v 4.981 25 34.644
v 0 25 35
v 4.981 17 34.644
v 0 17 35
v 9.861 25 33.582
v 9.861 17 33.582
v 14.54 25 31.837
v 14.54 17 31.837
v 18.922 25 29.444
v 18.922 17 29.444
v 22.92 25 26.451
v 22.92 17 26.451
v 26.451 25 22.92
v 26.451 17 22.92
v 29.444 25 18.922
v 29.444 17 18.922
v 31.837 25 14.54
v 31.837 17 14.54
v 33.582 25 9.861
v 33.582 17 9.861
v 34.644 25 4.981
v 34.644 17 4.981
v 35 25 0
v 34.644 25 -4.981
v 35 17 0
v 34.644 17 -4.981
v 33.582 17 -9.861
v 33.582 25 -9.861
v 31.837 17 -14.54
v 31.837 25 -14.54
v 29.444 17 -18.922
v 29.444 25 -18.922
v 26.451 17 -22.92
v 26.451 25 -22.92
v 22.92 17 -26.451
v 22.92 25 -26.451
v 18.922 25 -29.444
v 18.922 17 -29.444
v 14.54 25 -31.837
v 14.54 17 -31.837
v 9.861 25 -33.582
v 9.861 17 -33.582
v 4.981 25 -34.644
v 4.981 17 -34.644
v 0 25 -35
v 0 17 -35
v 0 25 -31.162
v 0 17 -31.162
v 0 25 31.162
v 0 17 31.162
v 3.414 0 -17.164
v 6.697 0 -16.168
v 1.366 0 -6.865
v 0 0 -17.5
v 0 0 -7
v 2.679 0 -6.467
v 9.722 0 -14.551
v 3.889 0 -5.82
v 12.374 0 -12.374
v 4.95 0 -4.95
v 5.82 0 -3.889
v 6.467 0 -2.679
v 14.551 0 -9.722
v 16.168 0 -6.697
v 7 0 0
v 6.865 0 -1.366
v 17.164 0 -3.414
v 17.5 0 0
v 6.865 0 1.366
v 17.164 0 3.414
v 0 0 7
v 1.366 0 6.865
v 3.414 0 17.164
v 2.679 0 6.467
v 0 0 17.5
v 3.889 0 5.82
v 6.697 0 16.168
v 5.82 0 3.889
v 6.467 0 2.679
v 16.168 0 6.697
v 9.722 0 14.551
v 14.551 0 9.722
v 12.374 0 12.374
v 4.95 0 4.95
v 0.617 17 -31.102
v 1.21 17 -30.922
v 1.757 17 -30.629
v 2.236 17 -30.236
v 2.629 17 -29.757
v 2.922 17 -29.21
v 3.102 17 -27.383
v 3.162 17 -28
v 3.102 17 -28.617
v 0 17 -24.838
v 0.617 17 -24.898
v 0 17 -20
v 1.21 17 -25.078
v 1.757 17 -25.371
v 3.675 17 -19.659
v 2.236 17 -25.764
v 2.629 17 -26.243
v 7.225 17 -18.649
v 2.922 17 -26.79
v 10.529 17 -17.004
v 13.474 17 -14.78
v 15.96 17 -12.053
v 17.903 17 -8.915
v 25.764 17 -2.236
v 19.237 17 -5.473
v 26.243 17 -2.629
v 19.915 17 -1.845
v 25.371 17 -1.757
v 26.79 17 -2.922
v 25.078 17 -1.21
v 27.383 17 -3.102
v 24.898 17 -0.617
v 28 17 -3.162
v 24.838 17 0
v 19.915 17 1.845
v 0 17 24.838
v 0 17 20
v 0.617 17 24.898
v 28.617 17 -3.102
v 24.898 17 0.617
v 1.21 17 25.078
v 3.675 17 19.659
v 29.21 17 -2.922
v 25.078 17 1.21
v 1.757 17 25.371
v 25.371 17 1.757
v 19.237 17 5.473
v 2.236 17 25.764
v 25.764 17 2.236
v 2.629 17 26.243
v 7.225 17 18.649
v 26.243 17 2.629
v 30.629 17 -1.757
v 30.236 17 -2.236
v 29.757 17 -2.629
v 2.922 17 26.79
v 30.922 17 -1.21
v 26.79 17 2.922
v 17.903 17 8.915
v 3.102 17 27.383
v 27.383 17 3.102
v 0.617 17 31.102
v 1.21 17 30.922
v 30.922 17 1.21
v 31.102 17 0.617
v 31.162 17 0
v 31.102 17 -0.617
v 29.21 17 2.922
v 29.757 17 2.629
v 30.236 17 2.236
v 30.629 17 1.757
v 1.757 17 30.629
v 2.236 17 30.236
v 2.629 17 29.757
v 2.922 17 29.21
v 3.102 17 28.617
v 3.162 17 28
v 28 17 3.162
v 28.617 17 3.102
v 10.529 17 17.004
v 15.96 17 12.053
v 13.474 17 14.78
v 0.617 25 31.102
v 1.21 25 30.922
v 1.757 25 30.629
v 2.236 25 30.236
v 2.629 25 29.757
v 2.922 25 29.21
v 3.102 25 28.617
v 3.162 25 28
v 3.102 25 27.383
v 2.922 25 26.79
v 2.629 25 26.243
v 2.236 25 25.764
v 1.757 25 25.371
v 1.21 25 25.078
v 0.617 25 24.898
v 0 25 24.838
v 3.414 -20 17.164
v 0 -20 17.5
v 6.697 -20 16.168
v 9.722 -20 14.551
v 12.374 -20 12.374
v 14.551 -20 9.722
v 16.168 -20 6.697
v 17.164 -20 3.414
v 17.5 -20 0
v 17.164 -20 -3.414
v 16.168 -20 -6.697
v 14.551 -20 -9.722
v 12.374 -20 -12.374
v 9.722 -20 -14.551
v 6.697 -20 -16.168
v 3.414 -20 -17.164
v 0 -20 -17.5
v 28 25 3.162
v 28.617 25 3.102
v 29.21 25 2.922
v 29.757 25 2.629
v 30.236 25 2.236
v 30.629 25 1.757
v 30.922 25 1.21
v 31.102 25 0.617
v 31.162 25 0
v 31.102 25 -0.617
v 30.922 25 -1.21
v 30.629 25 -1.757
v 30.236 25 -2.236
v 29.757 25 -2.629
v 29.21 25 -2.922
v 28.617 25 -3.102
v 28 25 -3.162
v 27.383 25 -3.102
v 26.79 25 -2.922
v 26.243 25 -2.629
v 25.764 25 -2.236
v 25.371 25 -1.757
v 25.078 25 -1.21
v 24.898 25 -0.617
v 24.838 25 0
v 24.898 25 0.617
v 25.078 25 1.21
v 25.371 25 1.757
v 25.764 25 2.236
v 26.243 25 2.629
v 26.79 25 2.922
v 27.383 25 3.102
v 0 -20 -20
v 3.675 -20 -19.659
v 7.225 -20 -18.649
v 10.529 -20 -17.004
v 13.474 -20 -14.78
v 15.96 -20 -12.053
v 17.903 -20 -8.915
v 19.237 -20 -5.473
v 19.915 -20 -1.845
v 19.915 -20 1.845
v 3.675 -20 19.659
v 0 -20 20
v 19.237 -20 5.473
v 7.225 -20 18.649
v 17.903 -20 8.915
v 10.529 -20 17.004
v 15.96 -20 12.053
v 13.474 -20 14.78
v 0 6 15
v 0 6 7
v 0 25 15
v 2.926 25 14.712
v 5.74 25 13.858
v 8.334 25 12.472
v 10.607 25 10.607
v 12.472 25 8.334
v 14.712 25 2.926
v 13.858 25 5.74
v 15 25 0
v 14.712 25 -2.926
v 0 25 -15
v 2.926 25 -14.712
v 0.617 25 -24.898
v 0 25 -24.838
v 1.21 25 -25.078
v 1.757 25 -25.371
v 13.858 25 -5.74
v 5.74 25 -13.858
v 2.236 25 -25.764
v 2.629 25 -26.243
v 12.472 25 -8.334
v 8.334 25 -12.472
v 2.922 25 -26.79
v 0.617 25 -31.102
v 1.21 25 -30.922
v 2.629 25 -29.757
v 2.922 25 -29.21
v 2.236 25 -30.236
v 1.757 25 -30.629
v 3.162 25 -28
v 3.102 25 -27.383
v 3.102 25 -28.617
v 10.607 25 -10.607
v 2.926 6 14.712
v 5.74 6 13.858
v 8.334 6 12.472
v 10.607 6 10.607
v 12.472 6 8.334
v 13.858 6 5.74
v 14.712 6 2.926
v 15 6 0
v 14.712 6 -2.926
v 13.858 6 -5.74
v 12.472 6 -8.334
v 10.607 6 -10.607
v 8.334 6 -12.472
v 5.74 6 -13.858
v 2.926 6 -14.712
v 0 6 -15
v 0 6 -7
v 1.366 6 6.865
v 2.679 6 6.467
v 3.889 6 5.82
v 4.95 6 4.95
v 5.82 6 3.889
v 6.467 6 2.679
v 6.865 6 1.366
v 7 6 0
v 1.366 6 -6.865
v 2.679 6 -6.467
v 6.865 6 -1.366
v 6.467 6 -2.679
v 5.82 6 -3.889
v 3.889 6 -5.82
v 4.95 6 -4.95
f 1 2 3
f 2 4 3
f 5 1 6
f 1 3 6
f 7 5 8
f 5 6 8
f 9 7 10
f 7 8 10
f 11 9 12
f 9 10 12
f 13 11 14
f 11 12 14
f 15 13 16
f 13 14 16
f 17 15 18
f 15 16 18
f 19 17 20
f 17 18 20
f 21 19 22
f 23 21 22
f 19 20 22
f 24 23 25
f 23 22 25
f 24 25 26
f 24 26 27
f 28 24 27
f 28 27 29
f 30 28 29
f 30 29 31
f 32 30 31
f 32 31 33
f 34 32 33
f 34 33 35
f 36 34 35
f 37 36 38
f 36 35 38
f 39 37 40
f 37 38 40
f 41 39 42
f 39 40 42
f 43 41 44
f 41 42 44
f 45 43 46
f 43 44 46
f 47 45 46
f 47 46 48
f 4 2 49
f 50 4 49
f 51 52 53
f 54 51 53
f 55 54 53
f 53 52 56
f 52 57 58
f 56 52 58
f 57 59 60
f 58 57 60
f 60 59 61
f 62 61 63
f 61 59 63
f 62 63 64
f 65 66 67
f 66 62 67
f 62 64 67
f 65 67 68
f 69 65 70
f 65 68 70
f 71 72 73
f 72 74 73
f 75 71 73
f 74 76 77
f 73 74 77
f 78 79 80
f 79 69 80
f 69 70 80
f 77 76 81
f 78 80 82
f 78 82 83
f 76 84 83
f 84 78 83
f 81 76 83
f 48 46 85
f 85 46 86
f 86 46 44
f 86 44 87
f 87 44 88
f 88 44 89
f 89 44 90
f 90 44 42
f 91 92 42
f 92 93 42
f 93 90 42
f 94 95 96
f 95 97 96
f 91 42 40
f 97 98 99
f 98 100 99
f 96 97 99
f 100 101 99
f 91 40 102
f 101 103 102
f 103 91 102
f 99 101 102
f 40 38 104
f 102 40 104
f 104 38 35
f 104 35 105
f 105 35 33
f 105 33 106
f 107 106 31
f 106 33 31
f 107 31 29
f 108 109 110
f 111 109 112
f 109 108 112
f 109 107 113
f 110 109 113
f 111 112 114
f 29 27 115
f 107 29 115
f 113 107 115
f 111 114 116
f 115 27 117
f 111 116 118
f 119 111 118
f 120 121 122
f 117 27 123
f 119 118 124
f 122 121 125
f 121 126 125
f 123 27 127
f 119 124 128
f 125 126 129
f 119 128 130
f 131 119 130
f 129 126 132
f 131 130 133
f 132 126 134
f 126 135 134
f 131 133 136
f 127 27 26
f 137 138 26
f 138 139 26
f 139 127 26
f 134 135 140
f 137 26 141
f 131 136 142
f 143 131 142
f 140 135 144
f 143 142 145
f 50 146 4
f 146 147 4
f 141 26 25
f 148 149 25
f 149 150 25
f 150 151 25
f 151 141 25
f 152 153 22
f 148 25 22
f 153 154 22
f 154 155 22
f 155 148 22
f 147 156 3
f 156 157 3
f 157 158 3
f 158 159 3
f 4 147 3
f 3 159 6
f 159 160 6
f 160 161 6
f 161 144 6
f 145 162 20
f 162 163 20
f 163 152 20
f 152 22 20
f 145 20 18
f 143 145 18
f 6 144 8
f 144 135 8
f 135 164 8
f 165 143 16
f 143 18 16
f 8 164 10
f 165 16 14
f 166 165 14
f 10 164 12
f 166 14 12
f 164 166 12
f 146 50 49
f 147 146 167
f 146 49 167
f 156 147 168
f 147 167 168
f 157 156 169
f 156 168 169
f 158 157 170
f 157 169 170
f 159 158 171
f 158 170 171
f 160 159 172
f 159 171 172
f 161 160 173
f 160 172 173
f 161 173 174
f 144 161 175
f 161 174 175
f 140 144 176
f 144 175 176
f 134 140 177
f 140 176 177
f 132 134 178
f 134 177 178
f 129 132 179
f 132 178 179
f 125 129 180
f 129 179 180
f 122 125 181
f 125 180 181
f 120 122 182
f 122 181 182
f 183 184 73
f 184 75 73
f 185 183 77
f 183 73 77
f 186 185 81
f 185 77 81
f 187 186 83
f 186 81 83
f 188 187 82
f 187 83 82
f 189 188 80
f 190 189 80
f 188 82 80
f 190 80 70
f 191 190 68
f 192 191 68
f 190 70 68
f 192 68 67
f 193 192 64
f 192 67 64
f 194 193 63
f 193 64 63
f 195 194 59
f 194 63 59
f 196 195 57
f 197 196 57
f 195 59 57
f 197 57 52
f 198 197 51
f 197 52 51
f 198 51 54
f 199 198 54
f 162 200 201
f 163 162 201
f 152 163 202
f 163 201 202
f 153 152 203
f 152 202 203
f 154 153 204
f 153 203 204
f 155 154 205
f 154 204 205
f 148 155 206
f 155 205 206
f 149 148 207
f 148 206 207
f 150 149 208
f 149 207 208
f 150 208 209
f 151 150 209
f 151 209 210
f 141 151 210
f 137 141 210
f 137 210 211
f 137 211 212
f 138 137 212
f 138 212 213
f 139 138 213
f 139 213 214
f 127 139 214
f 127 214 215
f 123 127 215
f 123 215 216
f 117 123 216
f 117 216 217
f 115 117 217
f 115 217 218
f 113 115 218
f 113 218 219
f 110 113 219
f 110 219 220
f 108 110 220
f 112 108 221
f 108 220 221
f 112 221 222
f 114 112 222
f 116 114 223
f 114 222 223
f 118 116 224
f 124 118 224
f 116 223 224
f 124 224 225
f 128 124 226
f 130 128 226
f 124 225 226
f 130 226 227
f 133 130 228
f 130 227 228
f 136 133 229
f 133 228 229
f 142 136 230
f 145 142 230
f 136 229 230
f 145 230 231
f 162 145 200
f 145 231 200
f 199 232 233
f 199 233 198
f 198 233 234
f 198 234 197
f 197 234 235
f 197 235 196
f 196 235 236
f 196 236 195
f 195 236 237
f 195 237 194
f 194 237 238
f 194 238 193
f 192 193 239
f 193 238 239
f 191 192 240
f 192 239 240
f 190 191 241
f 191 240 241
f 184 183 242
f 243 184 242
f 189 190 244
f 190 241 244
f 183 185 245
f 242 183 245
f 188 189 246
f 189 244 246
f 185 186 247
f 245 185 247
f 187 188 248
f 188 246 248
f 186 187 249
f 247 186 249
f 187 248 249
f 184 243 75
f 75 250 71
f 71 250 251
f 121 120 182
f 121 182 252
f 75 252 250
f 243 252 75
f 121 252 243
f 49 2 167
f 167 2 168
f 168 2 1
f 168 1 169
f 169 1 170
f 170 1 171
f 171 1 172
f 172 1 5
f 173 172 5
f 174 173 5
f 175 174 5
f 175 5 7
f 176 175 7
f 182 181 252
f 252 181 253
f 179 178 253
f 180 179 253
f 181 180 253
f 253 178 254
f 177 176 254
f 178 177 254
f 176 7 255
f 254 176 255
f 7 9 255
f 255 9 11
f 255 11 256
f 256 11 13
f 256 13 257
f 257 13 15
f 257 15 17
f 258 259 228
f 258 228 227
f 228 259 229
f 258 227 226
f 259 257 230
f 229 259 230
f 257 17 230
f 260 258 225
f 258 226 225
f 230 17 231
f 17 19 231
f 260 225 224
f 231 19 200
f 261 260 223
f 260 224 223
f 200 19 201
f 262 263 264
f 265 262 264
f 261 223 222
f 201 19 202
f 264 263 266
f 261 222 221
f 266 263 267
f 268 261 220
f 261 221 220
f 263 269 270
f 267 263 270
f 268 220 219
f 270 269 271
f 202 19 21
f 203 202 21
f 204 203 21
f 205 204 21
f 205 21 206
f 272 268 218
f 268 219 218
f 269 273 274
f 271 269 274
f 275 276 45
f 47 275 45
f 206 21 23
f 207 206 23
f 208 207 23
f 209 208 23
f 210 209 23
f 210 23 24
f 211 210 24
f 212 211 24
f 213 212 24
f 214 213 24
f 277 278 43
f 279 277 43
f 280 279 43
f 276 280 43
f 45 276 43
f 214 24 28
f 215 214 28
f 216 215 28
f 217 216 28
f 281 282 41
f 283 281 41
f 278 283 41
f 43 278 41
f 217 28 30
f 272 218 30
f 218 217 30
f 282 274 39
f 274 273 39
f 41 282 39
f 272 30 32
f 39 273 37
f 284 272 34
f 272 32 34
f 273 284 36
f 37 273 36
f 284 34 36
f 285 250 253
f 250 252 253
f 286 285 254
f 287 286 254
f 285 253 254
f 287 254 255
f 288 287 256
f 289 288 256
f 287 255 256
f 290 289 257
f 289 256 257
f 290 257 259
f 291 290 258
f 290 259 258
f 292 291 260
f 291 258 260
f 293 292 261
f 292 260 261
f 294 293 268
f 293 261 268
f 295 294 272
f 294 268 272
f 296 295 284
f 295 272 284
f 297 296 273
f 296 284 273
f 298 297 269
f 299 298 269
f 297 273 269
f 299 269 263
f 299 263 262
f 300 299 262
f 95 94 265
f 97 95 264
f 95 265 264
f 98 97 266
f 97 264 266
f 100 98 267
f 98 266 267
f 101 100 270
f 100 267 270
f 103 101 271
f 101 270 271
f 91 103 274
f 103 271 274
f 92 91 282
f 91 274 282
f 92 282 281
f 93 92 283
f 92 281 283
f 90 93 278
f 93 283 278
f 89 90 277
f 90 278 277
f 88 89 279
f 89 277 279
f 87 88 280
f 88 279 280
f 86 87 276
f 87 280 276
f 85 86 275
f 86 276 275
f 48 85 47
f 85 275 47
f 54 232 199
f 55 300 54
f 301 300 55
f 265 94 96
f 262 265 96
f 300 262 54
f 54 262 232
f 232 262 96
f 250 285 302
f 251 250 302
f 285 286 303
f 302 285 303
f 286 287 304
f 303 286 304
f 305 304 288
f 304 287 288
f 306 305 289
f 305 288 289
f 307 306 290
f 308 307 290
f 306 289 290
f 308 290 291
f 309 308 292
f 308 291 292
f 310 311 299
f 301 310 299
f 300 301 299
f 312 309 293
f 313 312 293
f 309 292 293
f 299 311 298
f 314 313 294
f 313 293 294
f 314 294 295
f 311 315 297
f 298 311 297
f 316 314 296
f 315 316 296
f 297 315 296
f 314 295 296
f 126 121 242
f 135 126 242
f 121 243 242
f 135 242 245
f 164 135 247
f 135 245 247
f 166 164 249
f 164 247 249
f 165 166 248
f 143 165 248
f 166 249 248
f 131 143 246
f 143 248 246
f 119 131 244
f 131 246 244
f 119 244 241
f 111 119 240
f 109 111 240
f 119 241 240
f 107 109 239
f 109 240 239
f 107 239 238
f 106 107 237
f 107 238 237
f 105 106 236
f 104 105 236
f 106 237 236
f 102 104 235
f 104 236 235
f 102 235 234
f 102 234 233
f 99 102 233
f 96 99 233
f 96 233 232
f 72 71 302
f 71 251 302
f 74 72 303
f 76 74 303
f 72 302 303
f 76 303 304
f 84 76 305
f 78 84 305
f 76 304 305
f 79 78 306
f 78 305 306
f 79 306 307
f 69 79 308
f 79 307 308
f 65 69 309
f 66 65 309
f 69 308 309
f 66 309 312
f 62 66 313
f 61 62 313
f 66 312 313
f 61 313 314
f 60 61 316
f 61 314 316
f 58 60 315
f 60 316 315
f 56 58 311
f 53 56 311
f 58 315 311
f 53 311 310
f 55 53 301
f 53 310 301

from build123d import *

# Parameters (mm, degrees)
BASE_R_VOLUTION_ANGLE   = 180
ESQUISSE2_R             = 3.16227766
ENL_V_MAT_EXTRU_1_DEPTH = 67.895440801


with BuildPart() as part:
    # Esquisse1 → Base-Révolution (revolve)
    with BuildSketch(Plane(origin=(0, 0, 0), x_dir=(0, 0, -1), z_dir=(1, 0, 0))):
        Polygon((-7, 0), (-7, 6), (-15, 6), (-15, 25), (-35, 25), (-35, 17), (-20, 17), (-20, -20), (-17.5, -20), (-17.5, 0), align=None)
    revolve(axis=Axis((0, 0, 0), (0, 1, 0)), revolution_arc=BASE_R_VOLUTION_ANGLE)

    # Esquisse2 → Enlèv. mat.-Extru.1 (cut, through all)
    with BuildSketch(Plane(origin=(0, 25, 0), x_dir=(-1, 0, 0), z_dir=(0, 1, 0))):
        with Locations((0, -28)):
            Circle(ESQUISSE2_R)
        with Locations((0, 28)):
            Circle(ESQUISSE2_R)
        with Locations(Location((-28, 0, 0), (0, 0, 90))):
            Circle(ESQUISSE2_R)
    extrude(amount=-ENL_V_MAT_EXTRU_1_DEPTH, mode=Mode.SUBTRACT)


solid = part.part
